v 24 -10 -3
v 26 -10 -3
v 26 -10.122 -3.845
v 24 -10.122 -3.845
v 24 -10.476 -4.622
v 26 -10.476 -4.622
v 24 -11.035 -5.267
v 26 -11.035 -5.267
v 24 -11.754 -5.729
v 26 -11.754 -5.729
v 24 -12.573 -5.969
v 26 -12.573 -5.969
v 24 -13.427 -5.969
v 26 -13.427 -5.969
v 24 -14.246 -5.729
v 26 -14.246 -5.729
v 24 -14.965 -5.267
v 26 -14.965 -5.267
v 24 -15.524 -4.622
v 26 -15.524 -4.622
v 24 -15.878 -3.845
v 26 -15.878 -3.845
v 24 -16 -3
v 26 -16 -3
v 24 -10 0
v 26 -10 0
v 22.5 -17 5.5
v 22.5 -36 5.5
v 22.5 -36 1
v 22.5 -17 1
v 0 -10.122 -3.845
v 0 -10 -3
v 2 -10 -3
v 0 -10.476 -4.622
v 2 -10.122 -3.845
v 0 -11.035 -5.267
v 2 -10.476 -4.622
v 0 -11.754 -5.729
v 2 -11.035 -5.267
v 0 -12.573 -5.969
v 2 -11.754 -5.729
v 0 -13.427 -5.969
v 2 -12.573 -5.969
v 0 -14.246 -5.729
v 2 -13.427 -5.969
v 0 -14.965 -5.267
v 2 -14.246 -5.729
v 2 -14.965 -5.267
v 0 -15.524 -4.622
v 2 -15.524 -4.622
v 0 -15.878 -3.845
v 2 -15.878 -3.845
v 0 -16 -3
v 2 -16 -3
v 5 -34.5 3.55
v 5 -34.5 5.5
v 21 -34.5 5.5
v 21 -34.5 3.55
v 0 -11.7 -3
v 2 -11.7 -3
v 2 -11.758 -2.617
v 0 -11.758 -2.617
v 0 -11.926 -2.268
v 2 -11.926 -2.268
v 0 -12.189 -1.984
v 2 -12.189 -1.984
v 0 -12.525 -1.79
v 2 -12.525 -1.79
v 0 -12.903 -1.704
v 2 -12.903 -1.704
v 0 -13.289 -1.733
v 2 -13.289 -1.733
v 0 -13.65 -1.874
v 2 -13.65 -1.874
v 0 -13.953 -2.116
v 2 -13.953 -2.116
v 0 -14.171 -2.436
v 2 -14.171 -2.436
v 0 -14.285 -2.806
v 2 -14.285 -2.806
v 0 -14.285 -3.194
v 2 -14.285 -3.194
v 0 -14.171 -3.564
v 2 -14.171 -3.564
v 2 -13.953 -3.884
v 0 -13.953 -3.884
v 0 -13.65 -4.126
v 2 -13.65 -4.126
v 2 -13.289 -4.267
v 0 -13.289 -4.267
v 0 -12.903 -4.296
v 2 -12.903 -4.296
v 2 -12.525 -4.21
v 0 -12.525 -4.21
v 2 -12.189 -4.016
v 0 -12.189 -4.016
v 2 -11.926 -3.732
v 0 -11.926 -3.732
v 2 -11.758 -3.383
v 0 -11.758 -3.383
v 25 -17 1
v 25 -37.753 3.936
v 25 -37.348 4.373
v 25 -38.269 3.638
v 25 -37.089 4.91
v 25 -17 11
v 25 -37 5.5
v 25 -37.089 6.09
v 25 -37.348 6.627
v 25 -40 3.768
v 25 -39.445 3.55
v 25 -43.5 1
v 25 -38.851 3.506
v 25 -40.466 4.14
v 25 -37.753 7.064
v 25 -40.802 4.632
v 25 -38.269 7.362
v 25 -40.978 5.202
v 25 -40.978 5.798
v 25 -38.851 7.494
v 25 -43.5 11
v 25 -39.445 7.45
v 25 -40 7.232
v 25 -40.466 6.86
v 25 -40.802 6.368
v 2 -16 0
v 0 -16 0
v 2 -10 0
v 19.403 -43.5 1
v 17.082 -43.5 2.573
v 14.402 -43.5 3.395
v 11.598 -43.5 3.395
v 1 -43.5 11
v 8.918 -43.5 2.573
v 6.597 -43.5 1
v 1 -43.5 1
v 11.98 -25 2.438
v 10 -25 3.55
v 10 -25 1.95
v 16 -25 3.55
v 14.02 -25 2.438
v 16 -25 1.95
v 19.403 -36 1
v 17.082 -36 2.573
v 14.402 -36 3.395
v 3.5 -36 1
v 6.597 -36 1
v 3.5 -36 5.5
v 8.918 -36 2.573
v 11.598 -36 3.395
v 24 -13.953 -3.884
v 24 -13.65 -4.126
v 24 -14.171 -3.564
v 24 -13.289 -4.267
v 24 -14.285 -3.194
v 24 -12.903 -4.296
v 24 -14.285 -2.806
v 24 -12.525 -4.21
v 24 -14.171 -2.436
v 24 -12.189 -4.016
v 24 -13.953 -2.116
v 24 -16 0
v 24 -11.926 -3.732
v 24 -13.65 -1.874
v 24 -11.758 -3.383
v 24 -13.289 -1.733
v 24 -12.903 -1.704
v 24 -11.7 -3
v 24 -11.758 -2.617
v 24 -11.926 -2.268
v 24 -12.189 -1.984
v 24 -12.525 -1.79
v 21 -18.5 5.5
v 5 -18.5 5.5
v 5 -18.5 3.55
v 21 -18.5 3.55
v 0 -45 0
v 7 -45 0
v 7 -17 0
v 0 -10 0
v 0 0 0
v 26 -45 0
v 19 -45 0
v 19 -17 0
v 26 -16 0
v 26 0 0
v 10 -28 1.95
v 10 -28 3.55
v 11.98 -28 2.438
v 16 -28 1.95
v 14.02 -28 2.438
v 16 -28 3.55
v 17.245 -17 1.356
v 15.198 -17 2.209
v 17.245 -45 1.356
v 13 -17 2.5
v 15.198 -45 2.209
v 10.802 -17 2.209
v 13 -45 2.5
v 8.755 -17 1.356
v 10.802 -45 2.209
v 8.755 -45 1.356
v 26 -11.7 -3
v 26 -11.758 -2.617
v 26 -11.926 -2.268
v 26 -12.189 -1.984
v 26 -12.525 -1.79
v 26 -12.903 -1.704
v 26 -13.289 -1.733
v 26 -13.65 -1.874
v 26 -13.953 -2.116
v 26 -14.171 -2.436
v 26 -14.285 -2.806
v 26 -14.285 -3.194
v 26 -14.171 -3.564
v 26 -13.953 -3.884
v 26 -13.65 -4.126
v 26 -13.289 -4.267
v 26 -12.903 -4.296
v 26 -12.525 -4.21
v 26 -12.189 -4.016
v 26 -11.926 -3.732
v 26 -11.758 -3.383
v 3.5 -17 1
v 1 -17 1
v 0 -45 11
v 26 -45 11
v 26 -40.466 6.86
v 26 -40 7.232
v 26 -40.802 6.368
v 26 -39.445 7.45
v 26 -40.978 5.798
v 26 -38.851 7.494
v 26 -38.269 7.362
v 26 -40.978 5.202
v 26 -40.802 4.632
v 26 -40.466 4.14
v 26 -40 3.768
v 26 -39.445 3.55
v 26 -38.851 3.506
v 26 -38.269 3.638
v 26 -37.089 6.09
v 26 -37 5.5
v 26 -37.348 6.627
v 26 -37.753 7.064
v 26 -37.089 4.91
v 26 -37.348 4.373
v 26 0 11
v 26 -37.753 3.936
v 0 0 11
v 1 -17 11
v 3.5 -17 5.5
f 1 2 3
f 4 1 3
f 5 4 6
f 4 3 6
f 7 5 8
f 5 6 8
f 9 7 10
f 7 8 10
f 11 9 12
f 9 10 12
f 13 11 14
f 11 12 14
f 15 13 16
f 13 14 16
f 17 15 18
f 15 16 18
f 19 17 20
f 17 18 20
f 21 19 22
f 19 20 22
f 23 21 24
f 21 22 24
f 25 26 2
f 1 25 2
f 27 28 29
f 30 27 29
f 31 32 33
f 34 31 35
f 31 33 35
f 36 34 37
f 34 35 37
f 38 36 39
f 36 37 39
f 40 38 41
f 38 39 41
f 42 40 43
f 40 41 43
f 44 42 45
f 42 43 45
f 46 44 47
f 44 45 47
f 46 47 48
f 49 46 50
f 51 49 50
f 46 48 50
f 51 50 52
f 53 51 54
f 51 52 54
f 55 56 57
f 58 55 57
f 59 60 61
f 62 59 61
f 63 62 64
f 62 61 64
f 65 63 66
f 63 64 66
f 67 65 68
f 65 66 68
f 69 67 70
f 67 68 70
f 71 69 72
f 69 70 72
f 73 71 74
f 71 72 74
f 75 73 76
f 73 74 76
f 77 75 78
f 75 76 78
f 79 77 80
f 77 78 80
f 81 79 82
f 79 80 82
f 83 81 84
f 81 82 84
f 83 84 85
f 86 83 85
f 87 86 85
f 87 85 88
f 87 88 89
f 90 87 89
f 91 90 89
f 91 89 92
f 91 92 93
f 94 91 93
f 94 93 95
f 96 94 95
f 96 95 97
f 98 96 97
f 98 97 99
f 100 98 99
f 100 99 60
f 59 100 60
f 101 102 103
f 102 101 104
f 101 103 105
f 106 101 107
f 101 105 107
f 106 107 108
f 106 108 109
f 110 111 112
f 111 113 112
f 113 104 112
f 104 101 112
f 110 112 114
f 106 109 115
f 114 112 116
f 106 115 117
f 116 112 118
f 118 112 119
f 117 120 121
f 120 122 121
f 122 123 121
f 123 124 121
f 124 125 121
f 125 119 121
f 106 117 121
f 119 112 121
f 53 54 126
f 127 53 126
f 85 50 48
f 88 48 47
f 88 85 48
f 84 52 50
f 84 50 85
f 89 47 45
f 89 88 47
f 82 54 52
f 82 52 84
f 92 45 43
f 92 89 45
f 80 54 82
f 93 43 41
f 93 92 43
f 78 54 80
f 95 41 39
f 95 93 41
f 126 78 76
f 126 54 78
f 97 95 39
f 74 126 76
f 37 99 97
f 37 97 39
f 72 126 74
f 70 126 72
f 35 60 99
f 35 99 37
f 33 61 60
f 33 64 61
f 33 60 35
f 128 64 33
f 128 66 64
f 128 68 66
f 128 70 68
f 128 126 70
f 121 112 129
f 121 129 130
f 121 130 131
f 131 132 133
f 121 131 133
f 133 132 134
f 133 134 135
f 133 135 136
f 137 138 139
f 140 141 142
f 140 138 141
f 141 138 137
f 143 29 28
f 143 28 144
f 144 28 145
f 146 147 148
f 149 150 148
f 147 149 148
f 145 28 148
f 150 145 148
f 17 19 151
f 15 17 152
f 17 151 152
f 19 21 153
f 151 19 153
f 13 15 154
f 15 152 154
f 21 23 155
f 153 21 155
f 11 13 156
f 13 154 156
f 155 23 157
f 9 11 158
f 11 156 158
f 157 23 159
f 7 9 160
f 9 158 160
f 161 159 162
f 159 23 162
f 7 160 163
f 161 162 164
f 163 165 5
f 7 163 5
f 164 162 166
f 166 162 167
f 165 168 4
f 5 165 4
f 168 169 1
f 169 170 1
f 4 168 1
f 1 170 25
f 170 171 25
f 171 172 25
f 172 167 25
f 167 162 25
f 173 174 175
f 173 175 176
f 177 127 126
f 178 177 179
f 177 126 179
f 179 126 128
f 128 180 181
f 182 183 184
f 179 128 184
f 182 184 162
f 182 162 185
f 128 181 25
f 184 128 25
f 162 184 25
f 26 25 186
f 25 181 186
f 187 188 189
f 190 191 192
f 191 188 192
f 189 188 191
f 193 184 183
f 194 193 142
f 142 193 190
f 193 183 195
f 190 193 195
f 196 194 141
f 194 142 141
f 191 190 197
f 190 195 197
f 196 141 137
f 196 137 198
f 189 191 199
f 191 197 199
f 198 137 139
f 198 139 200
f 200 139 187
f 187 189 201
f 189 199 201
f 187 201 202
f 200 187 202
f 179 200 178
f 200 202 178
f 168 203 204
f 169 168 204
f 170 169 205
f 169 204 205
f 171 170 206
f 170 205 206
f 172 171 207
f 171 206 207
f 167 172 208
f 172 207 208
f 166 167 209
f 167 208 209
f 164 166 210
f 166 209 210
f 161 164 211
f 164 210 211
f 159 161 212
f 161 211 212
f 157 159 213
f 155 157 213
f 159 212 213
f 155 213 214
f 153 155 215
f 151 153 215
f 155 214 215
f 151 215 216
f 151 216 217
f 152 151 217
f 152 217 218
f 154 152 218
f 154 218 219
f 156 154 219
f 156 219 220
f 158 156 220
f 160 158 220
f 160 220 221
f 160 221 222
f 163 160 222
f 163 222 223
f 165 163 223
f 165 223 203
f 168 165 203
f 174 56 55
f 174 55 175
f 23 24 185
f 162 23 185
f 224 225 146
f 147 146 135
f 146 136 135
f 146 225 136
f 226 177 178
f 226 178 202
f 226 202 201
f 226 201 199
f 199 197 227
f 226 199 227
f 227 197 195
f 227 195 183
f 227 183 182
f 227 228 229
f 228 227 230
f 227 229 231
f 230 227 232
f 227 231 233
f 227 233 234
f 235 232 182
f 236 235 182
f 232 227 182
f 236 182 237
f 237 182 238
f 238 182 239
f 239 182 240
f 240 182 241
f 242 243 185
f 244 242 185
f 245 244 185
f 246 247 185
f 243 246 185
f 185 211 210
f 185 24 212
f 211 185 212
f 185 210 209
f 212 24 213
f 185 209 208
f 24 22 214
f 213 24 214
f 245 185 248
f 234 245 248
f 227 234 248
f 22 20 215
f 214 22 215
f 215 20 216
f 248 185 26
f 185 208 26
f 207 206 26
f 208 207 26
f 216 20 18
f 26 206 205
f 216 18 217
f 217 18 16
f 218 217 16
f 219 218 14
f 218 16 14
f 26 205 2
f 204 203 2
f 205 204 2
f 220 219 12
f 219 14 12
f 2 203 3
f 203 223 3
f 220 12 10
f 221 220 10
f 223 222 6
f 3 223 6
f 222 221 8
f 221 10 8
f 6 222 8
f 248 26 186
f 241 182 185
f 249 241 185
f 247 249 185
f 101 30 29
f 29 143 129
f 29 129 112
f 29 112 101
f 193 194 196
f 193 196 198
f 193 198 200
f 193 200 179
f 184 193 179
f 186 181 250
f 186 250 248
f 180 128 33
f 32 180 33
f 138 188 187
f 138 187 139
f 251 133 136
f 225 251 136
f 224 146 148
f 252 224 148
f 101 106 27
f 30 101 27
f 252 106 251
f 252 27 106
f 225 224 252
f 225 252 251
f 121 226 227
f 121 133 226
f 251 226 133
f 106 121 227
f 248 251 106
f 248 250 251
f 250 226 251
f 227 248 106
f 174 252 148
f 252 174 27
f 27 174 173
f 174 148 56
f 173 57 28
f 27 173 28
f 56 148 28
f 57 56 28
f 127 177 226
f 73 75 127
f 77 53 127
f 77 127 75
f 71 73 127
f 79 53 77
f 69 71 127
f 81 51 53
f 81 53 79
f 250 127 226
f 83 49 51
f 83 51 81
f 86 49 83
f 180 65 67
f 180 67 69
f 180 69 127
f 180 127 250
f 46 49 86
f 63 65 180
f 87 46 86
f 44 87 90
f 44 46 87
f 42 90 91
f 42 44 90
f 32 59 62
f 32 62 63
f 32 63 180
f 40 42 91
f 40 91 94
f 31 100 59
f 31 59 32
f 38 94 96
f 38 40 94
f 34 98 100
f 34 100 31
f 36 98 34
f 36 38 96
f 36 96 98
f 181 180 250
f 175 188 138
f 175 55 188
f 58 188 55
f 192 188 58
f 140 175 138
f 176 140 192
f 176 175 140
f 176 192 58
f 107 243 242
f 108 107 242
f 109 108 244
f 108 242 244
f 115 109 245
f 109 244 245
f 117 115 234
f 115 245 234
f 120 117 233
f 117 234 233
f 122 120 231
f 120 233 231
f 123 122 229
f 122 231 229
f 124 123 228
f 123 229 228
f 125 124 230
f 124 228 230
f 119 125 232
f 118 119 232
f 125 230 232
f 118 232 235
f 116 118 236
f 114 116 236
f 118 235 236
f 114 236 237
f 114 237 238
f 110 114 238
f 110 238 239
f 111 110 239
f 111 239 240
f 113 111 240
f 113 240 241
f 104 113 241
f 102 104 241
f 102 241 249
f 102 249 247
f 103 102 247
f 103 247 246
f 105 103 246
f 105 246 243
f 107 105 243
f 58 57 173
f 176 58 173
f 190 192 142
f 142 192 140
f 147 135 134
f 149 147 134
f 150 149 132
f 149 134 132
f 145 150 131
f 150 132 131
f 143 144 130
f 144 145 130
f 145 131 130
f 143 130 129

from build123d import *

# Parameters (mm, degrees)
SKETCH1_W           = 26
SKETCH1_H           = 45
BOSS_EXTRUDE1_DEPTH = 11
SKETCH2_R           = 8.45
CUT_EXTRUDE1_DEPTH  = 28
CUT_EXTRUDE2_DEPTH  = 26.5
SKETCH5_W           = 6
SKETCH5_H           = 3
CUT_EXTRUDE3_DEPTH  = 53.509522946
BOSS_EXTRUDE4_START = 19
BOSS_EXTRUDE4_DEPTH = 19
SKETCH8_W           = 16
SKETCH8_H           = 16
CUT_EXTRUDE7_DEPTH  = 1.95
SKETCH9_W           = 6
SKETCH9_H           = 3
CUT_EXTRUDE8_DEPTH  = 53.502404707
SKETCH10_R          = 2
CUT_EXTRUDE9_DEPTH  = 4
SKETCH11_R          = 1.3
BOSS_EXTRUDE5_DEPTH = 26
SKETCH13_W          = 22
SKETCH13_H          = 12.79225404
CUT_EXTRUDE11_DEPTH = 54.122499941


with BuildPart() as part:
    # Sketch1 → Boss-Extrude1 (new body)
    with BuildSketch(Plane.XY):
        with Locations((13, -22.5)):
            Rectangle(SKETCH1_W, SKETCH1_H)
    extrude(amount=BOSS_EXTRUDE1_DEPTH)

    # Sketch2 → Cut-Extrude1 (cut)
    with BuildSketch(Plane.XZ.offset(45)):
        with Locations((13, -5.95)):
            Circle(SKETCH2_R)
    extrude(amount=-CUT_EXTRUDE1_DEPTH, mode=Mode.SUBTRACT)

    # Sketch4 → Cut-Extrude2 (cut)
    with BuildSketch(Plane(origin=(0, -43.5, 0), x_dir=(-1, 0, 0), z_dir=(0, -1, 0))):
        with BuildLine():
            Line((-1, -11), (-1, -1))
            Line((-1, -1), (-6.596875763, -1))
            ThreePointArc((-6.596875763, -1), (-13, -3.5), (-19.403124237, -1))
            Line((-19.403124237, -1), (-25, -1))
            Line((-25, -1), (-25, -11))
            Line((-25, -11), (-1, -11))
        make_face()
    extrude(amount=-CUT_EXTRUDE2_DEPTH, mode=Mode.SUBTRACT)

    # Sketch5 → Cut-Extrude3 (cut, through all)
    with BuildSketch(Plane.XY.offset(3.5)):
        with Locations((13, -26.5)):
            Rectangle(SKETCH5_W, SKETCH5_H)
    extrude(amount=-CUT_EXTRUDE3_DEPTH, mode=Mode.SUBTRACT)

    # Sketch6 → Boss-Extrude4 (add)
    with BuildSketch(Plane.XZ.offset(17).offset(BOSS_EXTRUDE4_START)):
        with BuildLine():
            Line((6.596875763, 1), (3.5, 1))
            Line((3.5, 1), (3.5, 5.5))
            Line((3.5, 5.5), (22.5, 5.5))
            Line((22.5, 5.5), (22.5, 1))
            Line((22.5, 1), (19.403124237, 1))
            ThreePointArc((19.403124237, 1), (13, 3.5), (6.596875763, 1))
        make_face()
    extrude(amount=-BOSS_EXTRUDE4_DEPTH)

    # Sketch8 → Cut-Extrude7 (cut)
    with BuildSketch(Plane.XY.offset(5.5)):
        with Locations((13, -26.5)):
            Rectangle(SKETCH8_W, SKETCH8_H)
    extrude(amount=-CUT_EXTRUDE7_DEPTH, mode=Mode.SUBTRACT)

    # Sketch9 → Cut-Extrude8 (cut, through all)
    with BuildSketch(Plane.XY.offset(3.55)):
        with Locations((13, -26.5)):
            Rectangle(SKETCH9_W, SKETCH9_H)
    extrude(amount=-CUT_EXTRUDE8_DEPTH, mode=Mode.SUBTRACT)

    # Sketch10 → Cut-Extrude9 (cut)
    with BuildSketch(Plane(origin=(26, 0, 0), x_dir=(0, 0, -1), z_dir=(1, 0, 0))):
        with Locations(Location((-5.5, -39, 0), (0, 0, 90))):
            Circle(SKETCH10_R)
    extrude(amount=-CUT_EXTRUDE9_DEPTH, mode=Mode.SUBTRACT)

    # Sketch11 → Boss-Extrude5 (add)
    with BuildSketch(Plane(origin=(26, 0, 0), x_dir=(0, 0, -1), z_dir=(1, 0, 0))):
        with BuildLine():
            Line((0, -10), (3, -10))
            ThreePointArc((3, -10), (6, -13), (3, -16))
            Line((3, -16), (0, -16))
            Line((0, -16), (0, -10))
        make_face()
        with Locations(Location((3, -13, 0), (0, 0, 90))):
            Circle(SKETCH11_R, mode=Mode.SUBTRACT)
    extrude(amount=-BOSS_EXTRUDE5_DEPTH)

    # Sketch13 → Cut-Extrude11 (cut, through all)
    with BuildSketch(Plane(origin=(0, 0, 0), x_dir=(-1, 0, 0), z_dir=(0, 0, -1))):
        with Locations((-13, -11.769971003)):
            Rectangle(SKETCH13_W, SKETCH13_H)
    extrude(amount=CUT_EXTRUDE11_DEPTH, mode=Mode.SUBTRACT)


solid = part.part
